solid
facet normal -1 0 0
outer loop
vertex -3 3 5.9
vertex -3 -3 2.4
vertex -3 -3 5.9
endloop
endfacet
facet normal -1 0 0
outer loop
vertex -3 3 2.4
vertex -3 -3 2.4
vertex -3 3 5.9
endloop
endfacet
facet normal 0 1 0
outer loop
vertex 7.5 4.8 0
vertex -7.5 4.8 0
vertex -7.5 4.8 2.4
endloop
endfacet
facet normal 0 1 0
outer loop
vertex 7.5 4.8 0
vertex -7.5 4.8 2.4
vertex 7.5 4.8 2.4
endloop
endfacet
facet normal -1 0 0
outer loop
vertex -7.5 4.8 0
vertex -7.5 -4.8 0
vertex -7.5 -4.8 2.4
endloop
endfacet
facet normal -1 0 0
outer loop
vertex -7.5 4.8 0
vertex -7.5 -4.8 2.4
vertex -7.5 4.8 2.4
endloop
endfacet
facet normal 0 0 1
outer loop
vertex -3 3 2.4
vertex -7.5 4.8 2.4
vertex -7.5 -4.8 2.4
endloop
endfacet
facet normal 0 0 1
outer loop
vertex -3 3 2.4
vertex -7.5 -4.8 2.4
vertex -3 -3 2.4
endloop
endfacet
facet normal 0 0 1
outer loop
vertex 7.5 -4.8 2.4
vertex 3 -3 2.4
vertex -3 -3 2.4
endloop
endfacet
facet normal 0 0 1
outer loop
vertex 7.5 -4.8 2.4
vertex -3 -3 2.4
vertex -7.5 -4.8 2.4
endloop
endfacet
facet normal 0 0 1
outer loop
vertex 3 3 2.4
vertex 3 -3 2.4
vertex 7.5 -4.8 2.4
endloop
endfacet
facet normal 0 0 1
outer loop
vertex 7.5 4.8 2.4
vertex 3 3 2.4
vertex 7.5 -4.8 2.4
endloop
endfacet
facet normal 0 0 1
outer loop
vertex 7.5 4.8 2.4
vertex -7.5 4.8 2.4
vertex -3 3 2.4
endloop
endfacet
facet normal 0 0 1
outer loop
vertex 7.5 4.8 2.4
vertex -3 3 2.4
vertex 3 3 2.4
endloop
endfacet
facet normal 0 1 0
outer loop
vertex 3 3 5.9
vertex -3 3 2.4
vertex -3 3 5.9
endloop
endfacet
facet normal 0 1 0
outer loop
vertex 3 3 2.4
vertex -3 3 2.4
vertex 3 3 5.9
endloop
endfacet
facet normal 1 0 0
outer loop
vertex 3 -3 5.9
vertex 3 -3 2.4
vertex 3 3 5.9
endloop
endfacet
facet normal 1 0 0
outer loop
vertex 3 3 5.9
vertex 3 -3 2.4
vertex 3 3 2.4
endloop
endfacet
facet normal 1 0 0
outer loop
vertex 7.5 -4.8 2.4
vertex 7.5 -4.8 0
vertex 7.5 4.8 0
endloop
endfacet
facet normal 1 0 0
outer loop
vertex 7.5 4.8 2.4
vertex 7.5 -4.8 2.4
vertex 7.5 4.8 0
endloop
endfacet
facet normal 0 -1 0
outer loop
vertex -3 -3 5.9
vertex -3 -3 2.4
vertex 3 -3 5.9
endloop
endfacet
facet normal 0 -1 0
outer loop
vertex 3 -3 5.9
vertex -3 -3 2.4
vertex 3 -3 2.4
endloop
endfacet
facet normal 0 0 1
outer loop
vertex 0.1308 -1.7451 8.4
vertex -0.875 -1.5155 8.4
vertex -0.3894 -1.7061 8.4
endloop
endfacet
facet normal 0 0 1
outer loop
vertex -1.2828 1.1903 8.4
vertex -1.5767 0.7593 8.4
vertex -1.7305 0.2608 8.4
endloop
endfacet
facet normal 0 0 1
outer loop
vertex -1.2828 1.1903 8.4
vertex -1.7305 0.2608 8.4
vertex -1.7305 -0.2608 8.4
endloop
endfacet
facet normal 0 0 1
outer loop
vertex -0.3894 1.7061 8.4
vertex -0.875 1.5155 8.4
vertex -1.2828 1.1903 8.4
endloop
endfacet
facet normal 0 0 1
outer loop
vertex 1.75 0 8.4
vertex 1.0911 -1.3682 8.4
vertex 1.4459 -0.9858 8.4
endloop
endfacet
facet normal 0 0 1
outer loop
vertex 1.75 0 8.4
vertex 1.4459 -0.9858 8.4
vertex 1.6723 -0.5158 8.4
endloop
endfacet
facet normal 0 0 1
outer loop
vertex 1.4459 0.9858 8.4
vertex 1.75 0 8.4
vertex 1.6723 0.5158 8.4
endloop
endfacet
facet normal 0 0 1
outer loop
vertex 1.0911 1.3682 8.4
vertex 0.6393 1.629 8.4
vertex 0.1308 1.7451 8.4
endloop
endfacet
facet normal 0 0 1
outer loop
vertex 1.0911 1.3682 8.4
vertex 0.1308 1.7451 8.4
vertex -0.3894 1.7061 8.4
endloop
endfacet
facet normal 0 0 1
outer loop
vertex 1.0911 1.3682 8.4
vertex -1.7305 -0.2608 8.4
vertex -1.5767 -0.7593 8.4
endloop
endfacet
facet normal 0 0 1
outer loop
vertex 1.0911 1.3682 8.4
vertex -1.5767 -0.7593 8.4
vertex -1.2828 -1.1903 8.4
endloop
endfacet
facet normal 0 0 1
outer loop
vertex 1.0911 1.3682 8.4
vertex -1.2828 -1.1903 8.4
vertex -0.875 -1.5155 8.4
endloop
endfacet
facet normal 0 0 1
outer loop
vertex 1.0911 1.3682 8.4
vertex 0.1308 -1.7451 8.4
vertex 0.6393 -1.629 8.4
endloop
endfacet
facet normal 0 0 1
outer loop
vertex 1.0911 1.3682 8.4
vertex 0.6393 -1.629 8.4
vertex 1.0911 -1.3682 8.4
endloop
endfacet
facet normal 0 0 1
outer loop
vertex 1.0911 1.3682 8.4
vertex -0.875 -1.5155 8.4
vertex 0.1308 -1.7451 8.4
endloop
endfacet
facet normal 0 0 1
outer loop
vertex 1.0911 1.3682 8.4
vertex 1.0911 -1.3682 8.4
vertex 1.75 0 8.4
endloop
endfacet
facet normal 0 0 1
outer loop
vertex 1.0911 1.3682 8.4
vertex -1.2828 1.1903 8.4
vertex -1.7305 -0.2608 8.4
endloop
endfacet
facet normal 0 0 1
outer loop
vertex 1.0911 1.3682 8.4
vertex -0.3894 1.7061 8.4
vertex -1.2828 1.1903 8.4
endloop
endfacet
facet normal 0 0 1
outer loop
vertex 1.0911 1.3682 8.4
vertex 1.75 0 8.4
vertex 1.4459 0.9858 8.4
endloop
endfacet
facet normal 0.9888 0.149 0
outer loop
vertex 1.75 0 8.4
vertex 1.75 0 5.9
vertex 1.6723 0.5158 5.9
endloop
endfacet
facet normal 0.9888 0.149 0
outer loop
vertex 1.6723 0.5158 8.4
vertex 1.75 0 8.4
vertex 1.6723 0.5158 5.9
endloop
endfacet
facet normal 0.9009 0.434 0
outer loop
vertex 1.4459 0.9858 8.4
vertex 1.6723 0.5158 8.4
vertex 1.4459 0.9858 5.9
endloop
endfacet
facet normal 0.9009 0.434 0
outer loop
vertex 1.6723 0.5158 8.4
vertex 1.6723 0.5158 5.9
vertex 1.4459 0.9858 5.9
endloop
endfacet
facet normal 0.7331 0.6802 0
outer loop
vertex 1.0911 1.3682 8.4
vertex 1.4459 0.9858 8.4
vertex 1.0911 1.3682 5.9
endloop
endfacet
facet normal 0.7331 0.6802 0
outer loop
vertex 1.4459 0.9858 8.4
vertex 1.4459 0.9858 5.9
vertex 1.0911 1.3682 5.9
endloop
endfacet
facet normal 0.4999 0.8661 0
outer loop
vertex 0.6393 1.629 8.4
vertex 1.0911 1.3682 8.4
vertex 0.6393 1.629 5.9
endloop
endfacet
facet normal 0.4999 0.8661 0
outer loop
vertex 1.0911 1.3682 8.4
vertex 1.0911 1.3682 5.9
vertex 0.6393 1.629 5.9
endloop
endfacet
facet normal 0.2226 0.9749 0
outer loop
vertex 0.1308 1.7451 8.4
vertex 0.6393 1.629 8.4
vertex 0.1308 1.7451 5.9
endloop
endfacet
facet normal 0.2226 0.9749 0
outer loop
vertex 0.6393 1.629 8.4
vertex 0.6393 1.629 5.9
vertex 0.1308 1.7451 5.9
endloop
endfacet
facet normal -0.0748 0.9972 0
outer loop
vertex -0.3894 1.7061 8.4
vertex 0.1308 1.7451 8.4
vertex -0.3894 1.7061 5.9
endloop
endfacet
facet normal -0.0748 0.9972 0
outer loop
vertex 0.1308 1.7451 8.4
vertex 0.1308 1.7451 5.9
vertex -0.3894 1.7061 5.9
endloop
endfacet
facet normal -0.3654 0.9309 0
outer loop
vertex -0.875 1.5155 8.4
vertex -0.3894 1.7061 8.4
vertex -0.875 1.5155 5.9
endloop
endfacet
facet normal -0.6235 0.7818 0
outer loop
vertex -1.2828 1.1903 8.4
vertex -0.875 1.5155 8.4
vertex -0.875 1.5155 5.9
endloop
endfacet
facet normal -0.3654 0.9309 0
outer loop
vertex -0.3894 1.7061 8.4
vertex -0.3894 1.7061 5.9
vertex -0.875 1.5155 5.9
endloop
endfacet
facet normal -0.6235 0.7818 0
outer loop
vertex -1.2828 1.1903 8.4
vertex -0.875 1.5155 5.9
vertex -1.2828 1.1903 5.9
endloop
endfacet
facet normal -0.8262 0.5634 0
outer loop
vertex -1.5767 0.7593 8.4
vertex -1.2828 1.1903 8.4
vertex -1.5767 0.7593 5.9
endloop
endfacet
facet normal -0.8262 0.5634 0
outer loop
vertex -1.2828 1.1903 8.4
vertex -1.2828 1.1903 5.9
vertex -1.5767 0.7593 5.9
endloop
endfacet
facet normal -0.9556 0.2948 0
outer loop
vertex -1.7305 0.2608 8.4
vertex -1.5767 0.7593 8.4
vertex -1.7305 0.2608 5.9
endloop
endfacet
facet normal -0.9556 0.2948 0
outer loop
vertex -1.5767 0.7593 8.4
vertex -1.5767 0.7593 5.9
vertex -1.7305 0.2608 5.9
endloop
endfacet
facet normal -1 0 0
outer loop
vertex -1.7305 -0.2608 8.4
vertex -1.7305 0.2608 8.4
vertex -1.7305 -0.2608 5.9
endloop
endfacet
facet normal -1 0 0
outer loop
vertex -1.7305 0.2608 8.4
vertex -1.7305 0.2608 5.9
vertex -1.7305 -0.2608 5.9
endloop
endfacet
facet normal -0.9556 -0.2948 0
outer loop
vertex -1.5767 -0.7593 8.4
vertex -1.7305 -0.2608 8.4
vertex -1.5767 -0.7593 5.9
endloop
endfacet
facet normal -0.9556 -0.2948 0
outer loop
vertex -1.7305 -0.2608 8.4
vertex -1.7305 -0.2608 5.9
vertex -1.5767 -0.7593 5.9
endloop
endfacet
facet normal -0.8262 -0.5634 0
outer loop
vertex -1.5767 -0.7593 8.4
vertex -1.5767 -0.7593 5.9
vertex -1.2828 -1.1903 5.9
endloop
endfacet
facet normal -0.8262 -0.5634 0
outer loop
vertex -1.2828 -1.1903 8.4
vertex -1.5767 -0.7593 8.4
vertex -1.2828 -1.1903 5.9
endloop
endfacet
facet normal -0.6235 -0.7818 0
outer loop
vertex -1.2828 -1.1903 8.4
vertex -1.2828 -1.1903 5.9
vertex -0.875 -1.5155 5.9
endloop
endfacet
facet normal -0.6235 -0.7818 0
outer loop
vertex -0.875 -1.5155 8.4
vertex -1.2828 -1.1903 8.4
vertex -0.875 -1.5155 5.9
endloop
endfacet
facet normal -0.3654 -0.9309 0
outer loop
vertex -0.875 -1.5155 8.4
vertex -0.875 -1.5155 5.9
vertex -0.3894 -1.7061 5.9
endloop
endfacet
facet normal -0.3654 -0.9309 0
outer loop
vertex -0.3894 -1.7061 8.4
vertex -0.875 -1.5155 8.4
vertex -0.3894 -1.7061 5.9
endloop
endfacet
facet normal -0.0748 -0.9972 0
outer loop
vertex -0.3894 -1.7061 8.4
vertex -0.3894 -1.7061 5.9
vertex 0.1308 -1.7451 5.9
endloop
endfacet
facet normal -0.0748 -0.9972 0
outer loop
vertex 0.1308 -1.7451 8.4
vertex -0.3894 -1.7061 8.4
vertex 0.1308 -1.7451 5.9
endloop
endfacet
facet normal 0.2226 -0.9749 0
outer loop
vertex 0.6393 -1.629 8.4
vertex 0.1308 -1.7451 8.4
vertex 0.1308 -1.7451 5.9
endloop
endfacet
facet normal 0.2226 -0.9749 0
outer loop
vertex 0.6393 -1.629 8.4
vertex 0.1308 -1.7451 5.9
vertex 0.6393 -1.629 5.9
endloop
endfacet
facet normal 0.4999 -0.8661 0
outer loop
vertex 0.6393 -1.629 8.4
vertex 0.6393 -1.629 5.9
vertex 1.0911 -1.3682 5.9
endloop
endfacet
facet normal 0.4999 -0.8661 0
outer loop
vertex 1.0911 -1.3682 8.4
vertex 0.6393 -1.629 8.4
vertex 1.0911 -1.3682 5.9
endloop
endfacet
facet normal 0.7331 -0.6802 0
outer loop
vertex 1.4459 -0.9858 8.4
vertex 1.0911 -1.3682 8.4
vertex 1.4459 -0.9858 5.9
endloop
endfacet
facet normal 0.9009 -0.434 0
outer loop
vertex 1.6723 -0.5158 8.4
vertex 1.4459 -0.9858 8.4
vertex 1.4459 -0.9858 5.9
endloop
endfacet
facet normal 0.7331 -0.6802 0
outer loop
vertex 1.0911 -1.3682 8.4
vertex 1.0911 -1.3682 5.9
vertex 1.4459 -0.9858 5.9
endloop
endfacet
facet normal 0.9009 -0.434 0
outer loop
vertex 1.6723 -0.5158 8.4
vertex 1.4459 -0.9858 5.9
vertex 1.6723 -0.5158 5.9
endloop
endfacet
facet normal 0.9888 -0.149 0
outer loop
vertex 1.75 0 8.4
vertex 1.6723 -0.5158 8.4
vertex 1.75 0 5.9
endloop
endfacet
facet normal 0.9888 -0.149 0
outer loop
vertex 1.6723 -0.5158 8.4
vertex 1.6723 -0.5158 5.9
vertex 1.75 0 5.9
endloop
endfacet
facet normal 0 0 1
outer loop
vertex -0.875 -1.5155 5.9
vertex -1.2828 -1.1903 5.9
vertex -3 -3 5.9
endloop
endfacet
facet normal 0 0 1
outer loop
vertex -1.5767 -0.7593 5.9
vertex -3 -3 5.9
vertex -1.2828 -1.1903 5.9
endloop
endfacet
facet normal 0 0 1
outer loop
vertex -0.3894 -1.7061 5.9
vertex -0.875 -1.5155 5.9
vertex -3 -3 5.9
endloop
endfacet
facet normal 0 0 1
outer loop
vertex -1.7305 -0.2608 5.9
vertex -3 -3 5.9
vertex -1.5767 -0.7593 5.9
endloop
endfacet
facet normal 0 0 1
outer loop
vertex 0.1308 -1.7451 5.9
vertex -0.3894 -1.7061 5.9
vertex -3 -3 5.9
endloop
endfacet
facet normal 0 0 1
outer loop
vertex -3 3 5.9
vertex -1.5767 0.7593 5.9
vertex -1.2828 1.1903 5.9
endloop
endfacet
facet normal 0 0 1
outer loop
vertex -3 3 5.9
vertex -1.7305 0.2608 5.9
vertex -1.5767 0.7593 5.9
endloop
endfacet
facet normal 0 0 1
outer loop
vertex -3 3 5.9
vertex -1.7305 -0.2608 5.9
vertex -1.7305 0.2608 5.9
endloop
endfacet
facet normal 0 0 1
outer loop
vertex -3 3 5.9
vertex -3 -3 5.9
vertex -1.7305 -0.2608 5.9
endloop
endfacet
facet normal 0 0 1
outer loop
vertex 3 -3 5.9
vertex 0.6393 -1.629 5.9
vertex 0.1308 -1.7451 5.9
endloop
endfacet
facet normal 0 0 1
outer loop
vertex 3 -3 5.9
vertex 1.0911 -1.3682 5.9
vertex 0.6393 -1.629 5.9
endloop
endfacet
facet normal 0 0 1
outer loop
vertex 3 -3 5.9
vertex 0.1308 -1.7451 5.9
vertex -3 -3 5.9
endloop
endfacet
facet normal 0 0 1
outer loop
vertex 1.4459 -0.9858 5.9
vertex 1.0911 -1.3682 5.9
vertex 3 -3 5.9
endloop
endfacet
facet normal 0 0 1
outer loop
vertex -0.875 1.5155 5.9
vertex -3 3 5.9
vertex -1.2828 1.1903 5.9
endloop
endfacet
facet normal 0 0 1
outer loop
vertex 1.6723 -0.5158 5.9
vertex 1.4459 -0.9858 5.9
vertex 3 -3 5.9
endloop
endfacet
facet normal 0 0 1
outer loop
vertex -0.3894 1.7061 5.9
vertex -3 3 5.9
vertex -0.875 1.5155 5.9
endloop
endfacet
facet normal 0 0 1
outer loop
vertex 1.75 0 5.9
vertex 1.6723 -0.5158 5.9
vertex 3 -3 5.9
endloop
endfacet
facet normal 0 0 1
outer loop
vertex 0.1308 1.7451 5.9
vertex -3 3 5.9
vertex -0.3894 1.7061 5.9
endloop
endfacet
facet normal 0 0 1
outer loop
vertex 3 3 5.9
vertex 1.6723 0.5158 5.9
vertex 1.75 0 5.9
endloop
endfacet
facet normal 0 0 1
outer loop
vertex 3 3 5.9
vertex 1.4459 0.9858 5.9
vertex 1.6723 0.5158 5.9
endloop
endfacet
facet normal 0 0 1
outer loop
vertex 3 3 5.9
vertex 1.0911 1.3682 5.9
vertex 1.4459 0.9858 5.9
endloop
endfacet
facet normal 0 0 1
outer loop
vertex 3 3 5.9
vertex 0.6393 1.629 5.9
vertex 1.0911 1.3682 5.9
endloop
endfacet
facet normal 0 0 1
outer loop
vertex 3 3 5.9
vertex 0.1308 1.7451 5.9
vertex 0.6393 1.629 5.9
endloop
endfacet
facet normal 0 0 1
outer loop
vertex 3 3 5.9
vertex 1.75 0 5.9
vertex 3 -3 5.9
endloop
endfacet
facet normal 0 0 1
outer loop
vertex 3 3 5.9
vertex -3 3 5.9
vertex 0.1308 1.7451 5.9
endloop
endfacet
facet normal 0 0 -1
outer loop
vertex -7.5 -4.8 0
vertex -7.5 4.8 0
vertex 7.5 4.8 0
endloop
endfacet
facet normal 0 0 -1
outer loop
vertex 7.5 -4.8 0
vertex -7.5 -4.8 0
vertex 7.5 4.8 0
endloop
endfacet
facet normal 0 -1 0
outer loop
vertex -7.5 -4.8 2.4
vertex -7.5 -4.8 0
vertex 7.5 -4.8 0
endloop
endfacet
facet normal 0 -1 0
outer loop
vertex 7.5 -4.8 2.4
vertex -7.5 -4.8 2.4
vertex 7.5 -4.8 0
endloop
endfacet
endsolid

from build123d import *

# Parameters (mm, degrees)
IZIM2_W                     = 15
IZIM2_H                     = 9.6
Y_KSEKLIK_EKSTR_ZYON1_DEPTH = 2.4
IZIM3_W                     = 6
IZIM3_H                     = 6
Y_KSEKLIK_EKSTR_ZYON2_DEPTH = 3.5
IZIM4_R                     = 1.75
Y_KSEKLIK_EKSTR_ZYON3_DEPTH = 2.5


with BuildPart() as part:
    # Çizim2 → Yükseklik-Ekstrüzyon1 (new body)
    with BuildSketch(Plane.XY):
        Rectangle(IZIM2_W, IZIM2_H)
    extrude(amount=Y_KSEKLIK_EKSTR_ZYON1_DEPTH)

    # Çizim3 → Yükseklik-Ekstrüzyon2 (add)
    with BuildSketch(Plane.XY.offset(2.4)):
        Rectangle(IZIM3_W, IZIM3_H)
    extrude(amount=Y_KSEKLIK_EKSTR_ZYON2_DEPTH)

    # Çizim4 → Yükseklik-Ekstrüzyon3 (add)
    with BuildSketch(Plane.XY.offset(5.9)):
        Circle(IZIM4_R)
    extrude(amount=Y_KSEKLIK_EKSTR_ZYON3_DEPTH)


solid = part.part
